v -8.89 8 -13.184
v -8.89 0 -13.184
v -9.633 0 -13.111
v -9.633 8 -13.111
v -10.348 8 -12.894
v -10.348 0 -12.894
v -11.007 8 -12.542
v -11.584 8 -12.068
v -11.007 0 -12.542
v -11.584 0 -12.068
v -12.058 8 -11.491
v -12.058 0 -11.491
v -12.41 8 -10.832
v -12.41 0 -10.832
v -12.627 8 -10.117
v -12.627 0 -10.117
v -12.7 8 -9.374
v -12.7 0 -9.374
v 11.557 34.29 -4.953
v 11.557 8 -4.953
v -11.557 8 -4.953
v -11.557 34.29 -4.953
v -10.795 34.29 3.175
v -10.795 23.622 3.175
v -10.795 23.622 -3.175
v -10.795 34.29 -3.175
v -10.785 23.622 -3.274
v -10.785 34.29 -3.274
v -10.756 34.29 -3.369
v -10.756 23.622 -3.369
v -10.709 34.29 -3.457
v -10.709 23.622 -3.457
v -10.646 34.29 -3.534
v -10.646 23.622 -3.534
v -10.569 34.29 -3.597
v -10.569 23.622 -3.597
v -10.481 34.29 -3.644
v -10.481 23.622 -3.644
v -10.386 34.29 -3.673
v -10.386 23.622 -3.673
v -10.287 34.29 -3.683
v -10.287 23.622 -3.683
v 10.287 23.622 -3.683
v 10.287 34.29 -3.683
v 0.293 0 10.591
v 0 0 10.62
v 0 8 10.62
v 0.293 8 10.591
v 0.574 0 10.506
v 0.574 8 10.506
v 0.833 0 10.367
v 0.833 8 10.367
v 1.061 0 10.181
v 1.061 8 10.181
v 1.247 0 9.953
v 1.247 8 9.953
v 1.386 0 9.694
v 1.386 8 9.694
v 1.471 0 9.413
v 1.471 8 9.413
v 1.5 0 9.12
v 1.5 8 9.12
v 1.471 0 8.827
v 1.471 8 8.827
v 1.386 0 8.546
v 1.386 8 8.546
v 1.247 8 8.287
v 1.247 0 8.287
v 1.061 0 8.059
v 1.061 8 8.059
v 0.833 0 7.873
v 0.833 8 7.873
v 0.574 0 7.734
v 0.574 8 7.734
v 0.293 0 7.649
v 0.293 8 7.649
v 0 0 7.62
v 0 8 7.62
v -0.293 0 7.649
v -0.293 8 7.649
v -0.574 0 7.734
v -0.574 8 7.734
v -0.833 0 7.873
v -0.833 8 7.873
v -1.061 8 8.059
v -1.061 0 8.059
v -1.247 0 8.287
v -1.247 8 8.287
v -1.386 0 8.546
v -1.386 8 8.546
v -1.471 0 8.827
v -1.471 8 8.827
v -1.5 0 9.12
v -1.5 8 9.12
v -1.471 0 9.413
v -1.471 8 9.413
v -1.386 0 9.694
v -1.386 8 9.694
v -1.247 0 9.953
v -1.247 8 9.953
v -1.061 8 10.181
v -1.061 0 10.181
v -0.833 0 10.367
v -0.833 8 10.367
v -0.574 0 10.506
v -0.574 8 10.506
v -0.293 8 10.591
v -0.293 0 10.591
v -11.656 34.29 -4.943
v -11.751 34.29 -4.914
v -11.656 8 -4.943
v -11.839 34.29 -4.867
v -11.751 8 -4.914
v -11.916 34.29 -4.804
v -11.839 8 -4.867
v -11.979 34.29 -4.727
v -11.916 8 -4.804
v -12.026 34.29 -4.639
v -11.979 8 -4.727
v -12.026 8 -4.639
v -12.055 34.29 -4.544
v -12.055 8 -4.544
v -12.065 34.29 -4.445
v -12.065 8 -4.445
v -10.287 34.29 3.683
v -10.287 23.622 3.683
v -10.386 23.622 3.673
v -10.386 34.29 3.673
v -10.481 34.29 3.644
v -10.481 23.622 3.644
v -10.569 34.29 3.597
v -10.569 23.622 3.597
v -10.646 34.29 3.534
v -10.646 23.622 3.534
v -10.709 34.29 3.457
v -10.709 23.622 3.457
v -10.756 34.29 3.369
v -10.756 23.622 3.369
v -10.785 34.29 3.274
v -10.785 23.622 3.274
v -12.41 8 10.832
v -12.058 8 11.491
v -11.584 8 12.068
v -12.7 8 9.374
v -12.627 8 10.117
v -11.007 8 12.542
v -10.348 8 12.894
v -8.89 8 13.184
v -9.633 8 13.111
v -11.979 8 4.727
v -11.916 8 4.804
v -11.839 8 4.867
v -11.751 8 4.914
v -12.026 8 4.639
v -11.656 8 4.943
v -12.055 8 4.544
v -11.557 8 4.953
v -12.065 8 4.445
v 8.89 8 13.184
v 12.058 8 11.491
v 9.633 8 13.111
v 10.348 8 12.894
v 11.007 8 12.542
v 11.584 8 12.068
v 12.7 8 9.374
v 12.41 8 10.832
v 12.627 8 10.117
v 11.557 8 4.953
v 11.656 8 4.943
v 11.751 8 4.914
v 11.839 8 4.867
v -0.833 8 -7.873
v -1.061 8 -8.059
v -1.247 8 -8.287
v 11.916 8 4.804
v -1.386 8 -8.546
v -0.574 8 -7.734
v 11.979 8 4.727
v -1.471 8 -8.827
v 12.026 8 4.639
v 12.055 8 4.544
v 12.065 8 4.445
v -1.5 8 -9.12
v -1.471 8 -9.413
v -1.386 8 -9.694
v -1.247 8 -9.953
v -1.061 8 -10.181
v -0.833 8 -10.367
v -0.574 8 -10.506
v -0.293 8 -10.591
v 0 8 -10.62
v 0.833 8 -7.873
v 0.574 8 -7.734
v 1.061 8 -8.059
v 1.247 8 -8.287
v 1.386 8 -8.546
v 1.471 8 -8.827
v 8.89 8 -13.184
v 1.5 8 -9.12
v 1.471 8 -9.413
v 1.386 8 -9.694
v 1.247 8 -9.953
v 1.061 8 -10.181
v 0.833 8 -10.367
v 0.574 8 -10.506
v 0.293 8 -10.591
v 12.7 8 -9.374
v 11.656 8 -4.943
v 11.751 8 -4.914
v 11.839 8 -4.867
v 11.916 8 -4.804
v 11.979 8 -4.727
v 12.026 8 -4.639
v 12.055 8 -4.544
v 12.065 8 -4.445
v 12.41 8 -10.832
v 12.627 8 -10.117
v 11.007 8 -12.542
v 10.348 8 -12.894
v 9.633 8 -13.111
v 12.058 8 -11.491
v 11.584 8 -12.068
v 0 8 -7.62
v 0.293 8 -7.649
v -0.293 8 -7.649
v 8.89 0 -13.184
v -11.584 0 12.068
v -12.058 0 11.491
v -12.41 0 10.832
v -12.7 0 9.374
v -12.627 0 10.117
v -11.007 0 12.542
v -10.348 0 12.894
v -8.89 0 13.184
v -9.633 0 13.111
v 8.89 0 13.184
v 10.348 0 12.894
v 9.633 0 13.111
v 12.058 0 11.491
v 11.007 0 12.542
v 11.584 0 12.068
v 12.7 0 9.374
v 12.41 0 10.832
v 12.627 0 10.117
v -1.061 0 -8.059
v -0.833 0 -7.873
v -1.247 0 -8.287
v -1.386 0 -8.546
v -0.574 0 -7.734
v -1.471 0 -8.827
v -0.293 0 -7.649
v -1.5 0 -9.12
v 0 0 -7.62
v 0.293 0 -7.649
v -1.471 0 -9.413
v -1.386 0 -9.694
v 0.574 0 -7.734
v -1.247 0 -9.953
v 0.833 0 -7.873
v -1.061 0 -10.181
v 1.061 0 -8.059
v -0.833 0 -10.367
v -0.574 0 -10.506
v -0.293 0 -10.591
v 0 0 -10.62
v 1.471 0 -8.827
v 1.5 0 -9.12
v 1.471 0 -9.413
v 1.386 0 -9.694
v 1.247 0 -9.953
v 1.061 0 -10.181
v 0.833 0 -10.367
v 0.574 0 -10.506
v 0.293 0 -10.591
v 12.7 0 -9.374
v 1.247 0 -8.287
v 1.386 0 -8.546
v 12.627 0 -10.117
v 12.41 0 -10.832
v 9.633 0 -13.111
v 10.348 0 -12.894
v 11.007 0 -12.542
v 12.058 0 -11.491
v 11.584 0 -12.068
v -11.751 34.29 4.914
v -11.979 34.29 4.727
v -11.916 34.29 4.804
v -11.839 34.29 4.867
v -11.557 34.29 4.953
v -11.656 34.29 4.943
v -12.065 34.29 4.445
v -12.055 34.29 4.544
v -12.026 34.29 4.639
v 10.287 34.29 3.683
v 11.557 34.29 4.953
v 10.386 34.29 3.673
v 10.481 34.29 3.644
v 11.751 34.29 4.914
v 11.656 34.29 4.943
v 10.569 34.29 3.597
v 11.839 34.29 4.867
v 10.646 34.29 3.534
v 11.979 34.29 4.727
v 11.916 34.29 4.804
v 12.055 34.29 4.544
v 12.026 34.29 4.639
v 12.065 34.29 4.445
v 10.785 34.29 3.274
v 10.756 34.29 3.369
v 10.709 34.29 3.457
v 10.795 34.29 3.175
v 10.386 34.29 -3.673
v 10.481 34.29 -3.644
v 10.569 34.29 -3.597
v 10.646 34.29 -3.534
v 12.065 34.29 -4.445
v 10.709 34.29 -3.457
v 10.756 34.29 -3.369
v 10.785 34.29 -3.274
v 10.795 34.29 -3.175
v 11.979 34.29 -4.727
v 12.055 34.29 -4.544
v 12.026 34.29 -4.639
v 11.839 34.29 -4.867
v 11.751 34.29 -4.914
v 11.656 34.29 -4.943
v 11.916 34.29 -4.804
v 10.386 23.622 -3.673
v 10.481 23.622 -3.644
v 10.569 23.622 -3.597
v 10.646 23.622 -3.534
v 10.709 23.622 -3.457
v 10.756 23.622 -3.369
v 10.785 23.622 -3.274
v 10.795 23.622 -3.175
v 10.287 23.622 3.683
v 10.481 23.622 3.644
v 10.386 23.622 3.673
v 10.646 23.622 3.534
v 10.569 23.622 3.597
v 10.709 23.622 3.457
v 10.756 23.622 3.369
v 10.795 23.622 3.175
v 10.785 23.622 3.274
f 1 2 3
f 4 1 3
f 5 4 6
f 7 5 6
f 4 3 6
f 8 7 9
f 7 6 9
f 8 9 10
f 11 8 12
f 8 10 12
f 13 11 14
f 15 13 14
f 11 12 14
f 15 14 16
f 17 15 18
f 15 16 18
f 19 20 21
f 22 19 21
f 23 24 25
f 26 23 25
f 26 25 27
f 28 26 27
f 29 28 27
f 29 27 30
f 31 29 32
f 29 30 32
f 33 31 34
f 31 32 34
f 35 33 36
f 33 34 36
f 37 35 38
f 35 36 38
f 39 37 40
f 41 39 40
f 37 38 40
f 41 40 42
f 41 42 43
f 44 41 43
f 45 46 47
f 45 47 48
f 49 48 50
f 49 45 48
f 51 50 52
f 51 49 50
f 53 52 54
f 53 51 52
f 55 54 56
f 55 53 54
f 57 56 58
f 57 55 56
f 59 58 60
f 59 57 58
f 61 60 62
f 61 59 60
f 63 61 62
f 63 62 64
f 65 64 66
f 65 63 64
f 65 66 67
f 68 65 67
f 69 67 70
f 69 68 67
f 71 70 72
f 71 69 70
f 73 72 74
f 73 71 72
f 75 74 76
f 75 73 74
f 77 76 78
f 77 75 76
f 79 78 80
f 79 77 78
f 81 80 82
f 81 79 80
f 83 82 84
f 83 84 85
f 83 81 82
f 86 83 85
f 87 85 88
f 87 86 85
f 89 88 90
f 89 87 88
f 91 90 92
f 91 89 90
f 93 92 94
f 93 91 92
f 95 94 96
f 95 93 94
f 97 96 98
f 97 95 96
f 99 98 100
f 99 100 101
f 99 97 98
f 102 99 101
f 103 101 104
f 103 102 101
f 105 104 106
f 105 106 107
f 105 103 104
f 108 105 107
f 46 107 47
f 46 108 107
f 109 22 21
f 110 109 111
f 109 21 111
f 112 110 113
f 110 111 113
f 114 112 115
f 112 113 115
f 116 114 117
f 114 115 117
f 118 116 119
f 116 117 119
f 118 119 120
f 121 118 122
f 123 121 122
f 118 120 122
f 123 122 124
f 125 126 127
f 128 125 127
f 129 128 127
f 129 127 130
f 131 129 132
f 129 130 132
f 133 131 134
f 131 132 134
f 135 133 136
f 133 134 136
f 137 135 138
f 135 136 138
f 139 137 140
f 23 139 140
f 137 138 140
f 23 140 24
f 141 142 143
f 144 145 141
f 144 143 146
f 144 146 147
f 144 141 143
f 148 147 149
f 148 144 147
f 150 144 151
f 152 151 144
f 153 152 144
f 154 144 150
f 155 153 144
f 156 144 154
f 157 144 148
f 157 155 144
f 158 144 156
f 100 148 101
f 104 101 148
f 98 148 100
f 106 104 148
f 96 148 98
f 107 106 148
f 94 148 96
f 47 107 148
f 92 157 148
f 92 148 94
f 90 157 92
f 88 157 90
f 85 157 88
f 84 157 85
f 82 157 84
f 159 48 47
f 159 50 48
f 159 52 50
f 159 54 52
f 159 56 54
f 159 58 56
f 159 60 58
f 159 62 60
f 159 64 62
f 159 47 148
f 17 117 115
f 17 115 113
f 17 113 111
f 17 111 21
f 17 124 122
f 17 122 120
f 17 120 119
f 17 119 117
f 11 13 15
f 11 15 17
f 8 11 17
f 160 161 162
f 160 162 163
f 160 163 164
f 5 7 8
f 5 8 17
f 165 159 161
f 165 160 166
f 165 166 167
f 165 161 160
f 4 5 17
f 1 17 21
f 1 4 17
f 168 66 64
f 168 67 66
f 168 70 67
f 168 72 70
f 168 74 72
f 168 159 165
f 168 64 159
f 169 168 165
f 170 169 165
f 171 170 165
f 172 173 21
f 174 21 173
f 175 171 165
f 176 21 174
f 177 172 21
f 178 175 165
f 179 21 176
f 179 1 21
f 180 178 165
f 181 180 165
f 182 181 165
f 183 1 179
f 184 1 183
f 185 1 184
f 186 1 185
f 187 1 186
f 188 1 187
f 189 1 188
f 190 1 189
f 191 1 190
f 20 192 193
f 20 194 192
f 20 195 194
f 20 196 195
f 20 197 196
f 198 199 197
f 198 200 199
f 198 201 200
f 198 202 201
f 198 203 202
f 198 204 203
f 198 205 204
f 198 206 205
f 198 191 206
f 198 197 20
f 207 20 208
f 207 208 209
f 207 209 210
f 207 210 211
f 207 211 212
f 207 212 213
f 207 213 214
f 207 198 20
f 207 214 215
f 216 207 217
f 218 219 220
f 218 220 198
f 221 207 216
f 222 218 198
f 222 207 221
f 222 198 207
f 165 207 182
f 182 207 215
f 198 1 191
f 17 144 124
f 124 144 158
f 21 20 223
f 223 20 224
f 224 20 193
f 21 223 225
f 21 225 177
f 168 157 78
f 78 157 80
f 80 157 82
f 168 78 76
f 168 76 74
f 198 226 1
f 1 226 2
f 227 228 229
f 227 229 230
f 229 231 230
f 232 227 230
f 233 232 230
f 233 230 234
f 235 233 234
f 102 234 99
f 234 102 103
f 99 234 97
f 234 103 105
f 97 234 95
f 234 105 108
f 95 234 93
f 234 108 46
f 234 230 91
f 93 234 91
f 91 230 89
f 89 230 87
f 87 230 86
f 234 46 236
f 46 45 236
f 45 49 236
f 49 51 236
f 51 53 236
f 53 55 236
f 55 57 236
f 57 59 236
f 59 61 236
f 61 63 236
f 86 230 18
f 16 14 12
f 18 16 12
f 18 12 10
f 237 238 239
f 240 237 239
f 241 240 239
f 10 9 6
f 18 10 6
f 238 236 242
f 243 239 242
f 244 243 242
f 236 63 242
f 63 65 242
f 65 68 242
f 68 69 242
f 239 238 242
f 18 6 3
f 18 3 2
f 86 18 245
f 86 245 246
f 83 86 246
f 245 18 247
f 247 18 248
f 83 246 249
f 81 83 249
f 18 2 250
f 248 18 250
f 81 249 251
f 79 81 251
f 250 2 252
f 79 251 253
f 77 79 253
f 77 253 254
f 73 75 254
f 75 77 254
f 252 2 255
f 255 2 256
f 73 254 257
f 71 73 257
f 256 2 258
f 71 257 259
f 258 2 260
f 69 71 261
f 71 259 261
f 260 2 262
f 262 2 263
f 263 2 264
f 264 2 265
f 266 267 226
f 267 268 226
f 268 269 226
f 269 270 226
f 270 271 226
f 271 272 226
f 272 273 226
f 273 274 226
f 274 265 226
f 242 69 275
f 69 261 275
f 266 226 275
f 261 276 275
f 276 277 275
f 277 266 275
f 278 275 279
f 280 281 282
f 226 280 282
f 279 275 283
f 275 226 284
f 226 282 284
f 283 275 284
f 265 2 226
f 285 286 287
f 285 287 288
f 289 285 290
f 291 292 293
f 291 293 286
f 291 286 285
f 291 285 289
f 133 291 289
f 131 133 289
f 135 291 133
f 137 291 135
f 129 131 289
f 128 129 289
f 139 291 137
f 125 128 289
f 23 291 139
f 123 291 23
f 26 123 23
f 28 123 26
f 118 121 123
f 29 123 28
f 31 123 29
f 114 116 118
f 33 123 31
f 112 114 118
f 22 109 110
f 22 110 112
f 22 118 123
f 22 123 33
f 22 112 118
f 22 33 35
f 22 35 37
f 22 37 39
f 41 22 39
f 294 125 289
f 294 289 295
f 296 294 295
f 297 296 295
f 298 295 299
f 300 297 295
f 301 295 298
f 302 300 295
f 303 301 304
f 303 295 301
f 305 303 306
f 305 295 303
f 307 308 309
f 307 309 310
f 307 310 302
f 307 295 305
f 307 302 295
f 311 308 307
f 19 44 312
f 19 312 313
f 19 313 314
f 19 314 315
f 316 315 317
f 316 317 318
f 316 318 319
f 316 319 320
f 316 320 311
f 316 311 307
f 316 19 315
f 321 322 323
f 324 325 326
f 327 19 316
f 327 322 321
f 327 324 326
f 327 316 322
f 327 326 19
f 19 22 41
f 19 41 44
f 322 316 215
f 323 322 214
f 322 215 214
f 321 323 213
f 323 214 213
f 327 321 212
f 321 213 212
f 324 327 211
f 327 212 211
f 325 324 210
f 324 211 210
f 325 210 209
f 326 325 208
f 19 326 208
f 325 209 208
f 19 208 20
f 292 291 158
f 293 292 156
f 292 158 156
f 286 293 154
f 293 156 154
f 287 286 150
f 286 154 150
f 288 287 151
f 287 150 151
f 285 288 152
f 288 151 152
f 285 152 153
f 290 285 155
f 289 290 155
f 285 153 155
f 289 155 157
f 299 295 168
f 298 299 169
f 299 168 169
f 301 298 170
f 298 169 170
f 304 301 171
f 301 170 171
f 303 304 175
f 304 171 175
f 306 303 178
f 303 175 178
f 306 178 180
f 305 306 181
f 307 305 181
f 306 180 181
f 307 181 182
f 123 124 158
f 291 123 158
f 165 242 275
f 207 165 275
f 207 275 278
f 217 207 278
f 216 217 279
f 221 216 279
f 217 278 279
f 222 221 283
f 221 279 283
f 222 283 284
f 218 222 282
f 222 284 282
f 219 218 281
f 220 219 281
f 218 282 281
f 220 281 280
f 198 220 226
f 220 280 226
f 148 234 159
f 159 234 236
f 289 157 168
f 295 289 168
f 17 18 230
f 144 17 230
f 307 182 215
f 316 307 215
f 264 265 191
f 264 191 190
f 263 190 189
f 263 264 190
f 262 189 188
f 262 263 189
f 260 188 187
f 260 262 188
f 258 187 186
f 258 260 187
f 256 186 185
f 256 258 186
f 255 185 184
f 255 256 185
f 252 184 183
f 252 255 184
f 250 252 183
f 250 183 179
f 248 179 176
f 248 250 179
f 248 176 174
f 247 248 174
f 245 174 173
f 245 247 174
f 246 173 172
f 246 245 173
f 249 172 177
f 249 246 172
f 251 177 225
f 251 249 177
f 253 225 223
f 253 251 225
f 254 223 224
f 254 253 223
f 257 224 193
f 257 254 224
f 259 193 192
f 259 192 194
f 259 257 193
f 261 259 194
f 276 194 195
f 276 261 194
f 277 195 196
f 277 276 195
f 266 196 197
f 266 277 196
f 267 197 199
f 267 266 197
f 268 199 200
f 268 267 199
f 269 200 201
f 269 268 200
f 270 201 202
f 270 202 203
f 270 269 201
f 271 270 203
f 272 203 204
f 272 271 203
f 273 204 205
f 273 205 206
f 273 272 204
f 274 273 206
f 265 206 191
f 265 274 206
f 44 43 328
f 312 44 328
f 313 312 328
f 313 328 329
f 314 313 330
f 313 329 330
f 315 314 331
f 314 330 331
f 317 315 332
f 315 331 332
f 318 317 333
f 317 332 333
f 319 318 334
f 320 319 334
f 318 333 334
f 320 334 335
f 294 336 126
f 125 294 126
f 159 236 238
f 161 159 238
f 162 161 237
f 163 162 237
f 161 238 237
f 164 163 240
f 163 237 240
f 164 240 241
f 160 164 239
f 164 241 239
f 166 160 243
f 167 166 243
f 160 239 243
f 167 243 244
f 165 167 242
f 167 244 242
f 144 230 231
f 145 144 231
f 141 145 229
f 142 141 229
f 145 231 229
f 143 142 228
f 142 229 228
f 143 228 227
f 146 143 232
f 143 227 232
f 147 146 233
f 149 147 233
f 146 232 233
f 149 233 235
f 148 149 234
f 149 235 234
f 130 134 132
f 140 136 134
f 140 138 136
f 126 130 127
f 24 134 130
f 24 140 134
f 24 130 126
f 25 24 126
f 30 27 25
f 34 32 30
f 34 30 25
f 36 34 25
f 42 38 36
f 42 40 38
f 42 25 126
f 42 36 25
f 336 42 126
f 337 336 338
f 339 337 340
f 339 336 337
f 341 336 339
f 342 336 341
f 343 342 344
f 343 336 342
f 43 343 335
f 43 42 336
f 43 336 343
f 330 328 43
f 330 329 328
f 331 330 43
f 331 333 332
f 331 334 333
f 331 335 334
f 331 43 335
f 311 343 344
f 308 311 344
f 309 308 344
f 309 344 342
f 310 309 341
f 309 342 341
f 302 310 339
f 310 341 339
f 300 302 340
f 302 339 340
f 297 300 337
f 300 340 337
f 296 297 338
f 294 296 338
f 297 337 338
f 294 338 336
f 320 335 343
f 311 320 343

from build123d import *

# Parameters (mm, degrees)
BOSS_EXTRUDE1_DEPTH = 23.622
BOSS_EXTRUDE2_DEPTH = 10.668
SKETCH4_R           = 1.499997
BOSS_EXTRUDE3_DEPTH = 8


with BuildPart() as part:
    # Sketch1 → Boss-Extrude1 (new body)
    with BuildSketch(Plane(origin=(0, 0, 0), x_dir=(1, 0, 0), z_dir=(0, 1, 0))):
        with BuildLine():
            Line((11.557, 4.953), (-11.557, 4.953))
            ThreePointArc((-11.557, 4.953), (-11.916210245, 4.804210245), (-12.065, 4.445))
            Line((-12.065, 4.445), (-12.065, -4.445))
            ThreePointArc((-12.065, -4.445), (-11.916210245, -4.804210245), (-11.557, -4.953))
            Line((-11.557, -4.953), (11.557, -4.953))
            ThreePointArc((11.557, -4.953), (11.916210245, -4.804210245), (12.065, -4.445))
            Line((12.065, -4.445), (12.065, 4.445))
            ThreePointArc((12.065, 4.445), (11.916210245, 4.804210245), (11.557, 4.953))
        make_face()
    extrude(amount=BOSS_EXTRUDE1_DEPTH)

    # Sketch2 → Boss-Extrude2 (add)
    with BuildSketch(Plane(origin=(0, 23.622, 0), x_dir=(1, 0, 0), z_dir=(0, 1, 0))):
        with BuildLine():
            Line((11.557, 4.953), (-11.557, 4.953))
            ThreePointArc((-11.557, 4.953), (-11.916210245, 4.804210245), (-12.065, 4.445))
            Line((-12.065, 4.445), (-12.065, -4.445))
            ThreePointArc((-12.065, -4.445), (-11.916210245, -4.804210245), (-11.557, -4.953))
            Line((-11.557, -4.953), (11.557, -4.953))
            ThreePointArc((11.557, -4.953), (11.916210245, -4.804210245), (12.065, -4.445))
            Line((12.065, -4.445), (12.065, 4.445))
            ThreePointArc((12.065, 4.445), (11.916210245, 4.804210245), (11.557, 4.953))
        make_face()
        with BuildLine():
            Line((10.287, -3.683), (-10.287, -3.683))
            ThreePointArc((-10.287, -3.683), (-10.646210245, -3.534210245), (-10.795, -3.175))
            Line((-10.795, -3.175), (-10.795, 3.175))
            ThreePointArc((-10.795, 3.175), (-10.646210245, 3.534210245), (-10.287, 3.683))
            Line((-10.287, 3.683), (10.287, 3.683))
            ThreePointArc((10.287, 3.683), (10.646210245, 3.534210245), (10.795, 3.175))
            Line((10.795, 3.175), (10.795, -3.175))
            ThreePointArc((10.795, -3.175), (10.646210245, -3.534210245), (10.287, -3.683))
        make_face(mode=Mode.SUBTRACT)
    extrude(amount=BOSS_EXTRUDE2_DEPTH)

    # Sketch4 → Boss-Extrude3 (add)
    with BuildSketch(Plane(origin=(0, 0, 0), x_dir=(1, 0, 0), z_dir=(0, 1, 0))):
        with BuildLine():
            Line((-8.89, -13.184), (8.89, -13.184))
            ThreePointArc((8.89, -13.184), (11.584076836, -12.068076836), (12.7, -9.374))
            Line((12.7, -9.374), (12.7, 9.374))
            ThreePointArc((12.7, 9.374), (11.584076836, 12.068076836), (8.89, 13.184))
            Line((8.89, 13.184), (-8.89, 13.184))
            ThreePointArc((-8.89, 13.184), (-11.584076836, 12.068076836), (-12.7, 9.374))
            Line((-12.7, 9.374), (-12.7, -9.374))
            ThreePointArc((-12.7, -9.374), (-11.584076836, -12.068076836), (-8.89, -13.184))
        make_face()
        with Locations(Location((0, -9.12, 0), (0, 0, 270))):
            Circle(SKETCH4_R, mode=Mode.SUBTRACT)
        with Locations(Location((0, 9.12, 0), (0, 0, 90))):
            Circle(SKETCH4_R, mode=Mode.SUBTRACT)
    extrude(amount=BOSS_EXTRUDE3_DEPTH)


solid = part.part
